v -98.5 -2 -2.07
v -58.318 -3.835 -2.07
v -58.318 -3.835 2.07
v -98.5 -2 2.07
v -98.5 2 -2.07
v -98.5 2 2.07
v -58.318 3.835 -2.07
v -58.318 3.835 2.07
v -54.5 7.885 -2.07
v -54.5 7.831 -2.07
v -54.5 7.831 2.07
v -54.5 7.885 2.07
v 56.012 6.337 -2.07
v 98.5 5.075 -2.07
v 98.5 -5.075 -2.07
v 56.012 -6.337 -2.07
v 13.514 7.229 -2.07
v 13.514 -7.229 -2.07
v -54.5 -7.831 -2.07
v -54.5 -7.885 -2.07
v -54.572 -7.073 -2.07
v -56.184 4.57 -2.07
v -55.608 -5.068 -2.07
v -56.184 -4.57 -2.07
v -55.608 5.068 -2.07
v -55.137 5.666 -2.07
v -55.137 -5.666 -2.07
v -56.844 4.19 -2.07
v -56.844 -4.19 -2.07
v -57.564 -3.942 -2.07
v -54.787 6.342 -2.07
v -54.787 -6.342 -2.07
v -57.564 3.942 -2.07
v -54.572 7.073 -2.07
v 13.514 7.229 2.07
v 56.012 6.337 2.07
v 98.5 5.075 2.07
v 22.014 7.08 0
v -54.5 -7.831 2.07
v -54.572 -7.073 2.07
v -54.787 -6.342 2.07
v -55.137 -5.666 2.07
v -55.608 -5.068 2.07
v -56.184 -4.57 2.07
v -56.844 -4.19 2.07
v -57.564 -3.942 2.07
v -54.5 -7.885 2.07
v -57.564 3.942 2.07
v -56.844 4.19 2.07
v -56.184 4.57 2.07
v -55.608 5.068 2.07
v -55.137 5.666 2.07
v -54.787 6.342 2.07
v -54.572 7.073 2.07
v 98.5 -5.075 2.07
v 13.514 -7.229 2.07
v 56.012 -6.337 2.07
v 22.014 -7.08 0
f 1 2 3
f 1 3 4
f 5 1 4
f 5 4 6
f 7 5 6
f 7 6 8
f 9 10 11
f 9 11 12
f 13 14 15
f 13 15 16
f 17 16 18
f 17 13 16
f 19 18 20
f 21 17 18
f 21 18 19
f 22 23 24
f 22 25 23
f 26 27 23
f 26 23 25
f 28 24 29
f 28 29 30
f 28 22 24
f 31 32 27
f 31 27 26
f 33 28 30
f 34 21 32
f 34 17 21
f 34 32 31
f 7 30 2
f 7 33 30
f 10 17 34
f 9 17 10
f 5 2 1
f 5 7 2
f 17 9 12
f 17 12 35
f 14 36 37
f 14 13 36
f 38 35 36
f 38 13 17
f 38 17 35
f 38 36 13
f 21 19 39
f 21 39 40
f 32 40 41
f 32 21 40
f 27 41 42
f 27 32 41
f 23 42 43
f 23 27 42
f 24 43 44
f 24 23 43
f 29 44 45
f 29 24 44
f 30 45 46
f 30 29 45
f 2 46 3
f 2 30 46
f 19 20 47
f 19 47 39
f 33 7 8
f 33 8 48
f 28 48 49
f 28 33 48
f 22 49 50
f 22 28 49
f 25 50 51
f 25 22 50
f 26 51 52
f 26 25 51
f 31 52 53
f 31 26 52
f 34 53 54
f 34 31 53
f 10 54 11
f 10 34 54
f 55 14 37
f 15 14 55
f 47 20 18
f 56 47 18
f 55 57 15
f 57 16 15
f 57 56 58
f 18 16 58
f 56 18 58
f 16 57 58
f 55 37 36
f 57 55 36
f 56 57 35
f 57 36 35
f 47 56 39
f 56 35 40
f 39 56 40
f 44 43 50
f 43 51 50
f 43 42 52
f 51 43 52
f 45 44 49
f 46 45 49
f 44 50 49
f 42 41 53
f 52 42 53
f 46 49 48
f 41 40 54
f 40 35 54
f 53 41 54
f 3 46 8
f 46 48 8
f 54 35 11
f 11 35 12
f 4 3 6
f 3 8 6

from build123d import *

# Parameters (mm, degrees)
BOSS_EXTRUDE1_DEPTH      = 2.07
BOSS_EXTRUDE1_DEPTH_BACK = 2.07


with BuildPart() as part:
    # Sketch1 → Boss-Extrude1 (new, two sides: drawn at the far end of the back side and taken through both)
    with BuildSketch(Plane.XY.offset(-BOSS_EXTRUDE1_DEPTH_BACK)):
        with BuildLine():
            Line((-98.5, -2), (-98.5, 2))
            Line((-98.5, 2), (-58.317523483, 3.835))
            ThreePointArc((-58.317523483, 3.835), (-55.607777146, 5.067676748), (-54.5, 7.830835622))
            Line((-54.5, 7.830835622), (-54.5, 7.885))
            add(Edge.make_bspline(
                [(-54.5, 7.885), (22.028887168, 7.680718763), (98.5, 5.075)],
                knots=[0, 0, 0, 1, 1, 1], degree=2))
            Line((98.5, 5.075), (98.5, -5.075))
            add(Edge.make_bspline(
                [(-54.5, -7.885), (22.028887168, -7.680718763), (98.5, -5.075)],
                knots=[0, 0, 0, 1, 1, 1], degree=2))
            Line((-54.5, -7.885), (-54.5, -7.830835622))
            ThreePointArc((-54.5, -7.830835622), (-55.607777146, -5.067676748), (-58.317523483, -3.835))
            Line((-58.317523483, -3.835), (-98.5, -2))
        make_face()
    extrude(amount=BOSS_EXTRUDE1_DEPTH + BOSS_EXTRUDE1_DEPTH_BACK)


solid = part.part
